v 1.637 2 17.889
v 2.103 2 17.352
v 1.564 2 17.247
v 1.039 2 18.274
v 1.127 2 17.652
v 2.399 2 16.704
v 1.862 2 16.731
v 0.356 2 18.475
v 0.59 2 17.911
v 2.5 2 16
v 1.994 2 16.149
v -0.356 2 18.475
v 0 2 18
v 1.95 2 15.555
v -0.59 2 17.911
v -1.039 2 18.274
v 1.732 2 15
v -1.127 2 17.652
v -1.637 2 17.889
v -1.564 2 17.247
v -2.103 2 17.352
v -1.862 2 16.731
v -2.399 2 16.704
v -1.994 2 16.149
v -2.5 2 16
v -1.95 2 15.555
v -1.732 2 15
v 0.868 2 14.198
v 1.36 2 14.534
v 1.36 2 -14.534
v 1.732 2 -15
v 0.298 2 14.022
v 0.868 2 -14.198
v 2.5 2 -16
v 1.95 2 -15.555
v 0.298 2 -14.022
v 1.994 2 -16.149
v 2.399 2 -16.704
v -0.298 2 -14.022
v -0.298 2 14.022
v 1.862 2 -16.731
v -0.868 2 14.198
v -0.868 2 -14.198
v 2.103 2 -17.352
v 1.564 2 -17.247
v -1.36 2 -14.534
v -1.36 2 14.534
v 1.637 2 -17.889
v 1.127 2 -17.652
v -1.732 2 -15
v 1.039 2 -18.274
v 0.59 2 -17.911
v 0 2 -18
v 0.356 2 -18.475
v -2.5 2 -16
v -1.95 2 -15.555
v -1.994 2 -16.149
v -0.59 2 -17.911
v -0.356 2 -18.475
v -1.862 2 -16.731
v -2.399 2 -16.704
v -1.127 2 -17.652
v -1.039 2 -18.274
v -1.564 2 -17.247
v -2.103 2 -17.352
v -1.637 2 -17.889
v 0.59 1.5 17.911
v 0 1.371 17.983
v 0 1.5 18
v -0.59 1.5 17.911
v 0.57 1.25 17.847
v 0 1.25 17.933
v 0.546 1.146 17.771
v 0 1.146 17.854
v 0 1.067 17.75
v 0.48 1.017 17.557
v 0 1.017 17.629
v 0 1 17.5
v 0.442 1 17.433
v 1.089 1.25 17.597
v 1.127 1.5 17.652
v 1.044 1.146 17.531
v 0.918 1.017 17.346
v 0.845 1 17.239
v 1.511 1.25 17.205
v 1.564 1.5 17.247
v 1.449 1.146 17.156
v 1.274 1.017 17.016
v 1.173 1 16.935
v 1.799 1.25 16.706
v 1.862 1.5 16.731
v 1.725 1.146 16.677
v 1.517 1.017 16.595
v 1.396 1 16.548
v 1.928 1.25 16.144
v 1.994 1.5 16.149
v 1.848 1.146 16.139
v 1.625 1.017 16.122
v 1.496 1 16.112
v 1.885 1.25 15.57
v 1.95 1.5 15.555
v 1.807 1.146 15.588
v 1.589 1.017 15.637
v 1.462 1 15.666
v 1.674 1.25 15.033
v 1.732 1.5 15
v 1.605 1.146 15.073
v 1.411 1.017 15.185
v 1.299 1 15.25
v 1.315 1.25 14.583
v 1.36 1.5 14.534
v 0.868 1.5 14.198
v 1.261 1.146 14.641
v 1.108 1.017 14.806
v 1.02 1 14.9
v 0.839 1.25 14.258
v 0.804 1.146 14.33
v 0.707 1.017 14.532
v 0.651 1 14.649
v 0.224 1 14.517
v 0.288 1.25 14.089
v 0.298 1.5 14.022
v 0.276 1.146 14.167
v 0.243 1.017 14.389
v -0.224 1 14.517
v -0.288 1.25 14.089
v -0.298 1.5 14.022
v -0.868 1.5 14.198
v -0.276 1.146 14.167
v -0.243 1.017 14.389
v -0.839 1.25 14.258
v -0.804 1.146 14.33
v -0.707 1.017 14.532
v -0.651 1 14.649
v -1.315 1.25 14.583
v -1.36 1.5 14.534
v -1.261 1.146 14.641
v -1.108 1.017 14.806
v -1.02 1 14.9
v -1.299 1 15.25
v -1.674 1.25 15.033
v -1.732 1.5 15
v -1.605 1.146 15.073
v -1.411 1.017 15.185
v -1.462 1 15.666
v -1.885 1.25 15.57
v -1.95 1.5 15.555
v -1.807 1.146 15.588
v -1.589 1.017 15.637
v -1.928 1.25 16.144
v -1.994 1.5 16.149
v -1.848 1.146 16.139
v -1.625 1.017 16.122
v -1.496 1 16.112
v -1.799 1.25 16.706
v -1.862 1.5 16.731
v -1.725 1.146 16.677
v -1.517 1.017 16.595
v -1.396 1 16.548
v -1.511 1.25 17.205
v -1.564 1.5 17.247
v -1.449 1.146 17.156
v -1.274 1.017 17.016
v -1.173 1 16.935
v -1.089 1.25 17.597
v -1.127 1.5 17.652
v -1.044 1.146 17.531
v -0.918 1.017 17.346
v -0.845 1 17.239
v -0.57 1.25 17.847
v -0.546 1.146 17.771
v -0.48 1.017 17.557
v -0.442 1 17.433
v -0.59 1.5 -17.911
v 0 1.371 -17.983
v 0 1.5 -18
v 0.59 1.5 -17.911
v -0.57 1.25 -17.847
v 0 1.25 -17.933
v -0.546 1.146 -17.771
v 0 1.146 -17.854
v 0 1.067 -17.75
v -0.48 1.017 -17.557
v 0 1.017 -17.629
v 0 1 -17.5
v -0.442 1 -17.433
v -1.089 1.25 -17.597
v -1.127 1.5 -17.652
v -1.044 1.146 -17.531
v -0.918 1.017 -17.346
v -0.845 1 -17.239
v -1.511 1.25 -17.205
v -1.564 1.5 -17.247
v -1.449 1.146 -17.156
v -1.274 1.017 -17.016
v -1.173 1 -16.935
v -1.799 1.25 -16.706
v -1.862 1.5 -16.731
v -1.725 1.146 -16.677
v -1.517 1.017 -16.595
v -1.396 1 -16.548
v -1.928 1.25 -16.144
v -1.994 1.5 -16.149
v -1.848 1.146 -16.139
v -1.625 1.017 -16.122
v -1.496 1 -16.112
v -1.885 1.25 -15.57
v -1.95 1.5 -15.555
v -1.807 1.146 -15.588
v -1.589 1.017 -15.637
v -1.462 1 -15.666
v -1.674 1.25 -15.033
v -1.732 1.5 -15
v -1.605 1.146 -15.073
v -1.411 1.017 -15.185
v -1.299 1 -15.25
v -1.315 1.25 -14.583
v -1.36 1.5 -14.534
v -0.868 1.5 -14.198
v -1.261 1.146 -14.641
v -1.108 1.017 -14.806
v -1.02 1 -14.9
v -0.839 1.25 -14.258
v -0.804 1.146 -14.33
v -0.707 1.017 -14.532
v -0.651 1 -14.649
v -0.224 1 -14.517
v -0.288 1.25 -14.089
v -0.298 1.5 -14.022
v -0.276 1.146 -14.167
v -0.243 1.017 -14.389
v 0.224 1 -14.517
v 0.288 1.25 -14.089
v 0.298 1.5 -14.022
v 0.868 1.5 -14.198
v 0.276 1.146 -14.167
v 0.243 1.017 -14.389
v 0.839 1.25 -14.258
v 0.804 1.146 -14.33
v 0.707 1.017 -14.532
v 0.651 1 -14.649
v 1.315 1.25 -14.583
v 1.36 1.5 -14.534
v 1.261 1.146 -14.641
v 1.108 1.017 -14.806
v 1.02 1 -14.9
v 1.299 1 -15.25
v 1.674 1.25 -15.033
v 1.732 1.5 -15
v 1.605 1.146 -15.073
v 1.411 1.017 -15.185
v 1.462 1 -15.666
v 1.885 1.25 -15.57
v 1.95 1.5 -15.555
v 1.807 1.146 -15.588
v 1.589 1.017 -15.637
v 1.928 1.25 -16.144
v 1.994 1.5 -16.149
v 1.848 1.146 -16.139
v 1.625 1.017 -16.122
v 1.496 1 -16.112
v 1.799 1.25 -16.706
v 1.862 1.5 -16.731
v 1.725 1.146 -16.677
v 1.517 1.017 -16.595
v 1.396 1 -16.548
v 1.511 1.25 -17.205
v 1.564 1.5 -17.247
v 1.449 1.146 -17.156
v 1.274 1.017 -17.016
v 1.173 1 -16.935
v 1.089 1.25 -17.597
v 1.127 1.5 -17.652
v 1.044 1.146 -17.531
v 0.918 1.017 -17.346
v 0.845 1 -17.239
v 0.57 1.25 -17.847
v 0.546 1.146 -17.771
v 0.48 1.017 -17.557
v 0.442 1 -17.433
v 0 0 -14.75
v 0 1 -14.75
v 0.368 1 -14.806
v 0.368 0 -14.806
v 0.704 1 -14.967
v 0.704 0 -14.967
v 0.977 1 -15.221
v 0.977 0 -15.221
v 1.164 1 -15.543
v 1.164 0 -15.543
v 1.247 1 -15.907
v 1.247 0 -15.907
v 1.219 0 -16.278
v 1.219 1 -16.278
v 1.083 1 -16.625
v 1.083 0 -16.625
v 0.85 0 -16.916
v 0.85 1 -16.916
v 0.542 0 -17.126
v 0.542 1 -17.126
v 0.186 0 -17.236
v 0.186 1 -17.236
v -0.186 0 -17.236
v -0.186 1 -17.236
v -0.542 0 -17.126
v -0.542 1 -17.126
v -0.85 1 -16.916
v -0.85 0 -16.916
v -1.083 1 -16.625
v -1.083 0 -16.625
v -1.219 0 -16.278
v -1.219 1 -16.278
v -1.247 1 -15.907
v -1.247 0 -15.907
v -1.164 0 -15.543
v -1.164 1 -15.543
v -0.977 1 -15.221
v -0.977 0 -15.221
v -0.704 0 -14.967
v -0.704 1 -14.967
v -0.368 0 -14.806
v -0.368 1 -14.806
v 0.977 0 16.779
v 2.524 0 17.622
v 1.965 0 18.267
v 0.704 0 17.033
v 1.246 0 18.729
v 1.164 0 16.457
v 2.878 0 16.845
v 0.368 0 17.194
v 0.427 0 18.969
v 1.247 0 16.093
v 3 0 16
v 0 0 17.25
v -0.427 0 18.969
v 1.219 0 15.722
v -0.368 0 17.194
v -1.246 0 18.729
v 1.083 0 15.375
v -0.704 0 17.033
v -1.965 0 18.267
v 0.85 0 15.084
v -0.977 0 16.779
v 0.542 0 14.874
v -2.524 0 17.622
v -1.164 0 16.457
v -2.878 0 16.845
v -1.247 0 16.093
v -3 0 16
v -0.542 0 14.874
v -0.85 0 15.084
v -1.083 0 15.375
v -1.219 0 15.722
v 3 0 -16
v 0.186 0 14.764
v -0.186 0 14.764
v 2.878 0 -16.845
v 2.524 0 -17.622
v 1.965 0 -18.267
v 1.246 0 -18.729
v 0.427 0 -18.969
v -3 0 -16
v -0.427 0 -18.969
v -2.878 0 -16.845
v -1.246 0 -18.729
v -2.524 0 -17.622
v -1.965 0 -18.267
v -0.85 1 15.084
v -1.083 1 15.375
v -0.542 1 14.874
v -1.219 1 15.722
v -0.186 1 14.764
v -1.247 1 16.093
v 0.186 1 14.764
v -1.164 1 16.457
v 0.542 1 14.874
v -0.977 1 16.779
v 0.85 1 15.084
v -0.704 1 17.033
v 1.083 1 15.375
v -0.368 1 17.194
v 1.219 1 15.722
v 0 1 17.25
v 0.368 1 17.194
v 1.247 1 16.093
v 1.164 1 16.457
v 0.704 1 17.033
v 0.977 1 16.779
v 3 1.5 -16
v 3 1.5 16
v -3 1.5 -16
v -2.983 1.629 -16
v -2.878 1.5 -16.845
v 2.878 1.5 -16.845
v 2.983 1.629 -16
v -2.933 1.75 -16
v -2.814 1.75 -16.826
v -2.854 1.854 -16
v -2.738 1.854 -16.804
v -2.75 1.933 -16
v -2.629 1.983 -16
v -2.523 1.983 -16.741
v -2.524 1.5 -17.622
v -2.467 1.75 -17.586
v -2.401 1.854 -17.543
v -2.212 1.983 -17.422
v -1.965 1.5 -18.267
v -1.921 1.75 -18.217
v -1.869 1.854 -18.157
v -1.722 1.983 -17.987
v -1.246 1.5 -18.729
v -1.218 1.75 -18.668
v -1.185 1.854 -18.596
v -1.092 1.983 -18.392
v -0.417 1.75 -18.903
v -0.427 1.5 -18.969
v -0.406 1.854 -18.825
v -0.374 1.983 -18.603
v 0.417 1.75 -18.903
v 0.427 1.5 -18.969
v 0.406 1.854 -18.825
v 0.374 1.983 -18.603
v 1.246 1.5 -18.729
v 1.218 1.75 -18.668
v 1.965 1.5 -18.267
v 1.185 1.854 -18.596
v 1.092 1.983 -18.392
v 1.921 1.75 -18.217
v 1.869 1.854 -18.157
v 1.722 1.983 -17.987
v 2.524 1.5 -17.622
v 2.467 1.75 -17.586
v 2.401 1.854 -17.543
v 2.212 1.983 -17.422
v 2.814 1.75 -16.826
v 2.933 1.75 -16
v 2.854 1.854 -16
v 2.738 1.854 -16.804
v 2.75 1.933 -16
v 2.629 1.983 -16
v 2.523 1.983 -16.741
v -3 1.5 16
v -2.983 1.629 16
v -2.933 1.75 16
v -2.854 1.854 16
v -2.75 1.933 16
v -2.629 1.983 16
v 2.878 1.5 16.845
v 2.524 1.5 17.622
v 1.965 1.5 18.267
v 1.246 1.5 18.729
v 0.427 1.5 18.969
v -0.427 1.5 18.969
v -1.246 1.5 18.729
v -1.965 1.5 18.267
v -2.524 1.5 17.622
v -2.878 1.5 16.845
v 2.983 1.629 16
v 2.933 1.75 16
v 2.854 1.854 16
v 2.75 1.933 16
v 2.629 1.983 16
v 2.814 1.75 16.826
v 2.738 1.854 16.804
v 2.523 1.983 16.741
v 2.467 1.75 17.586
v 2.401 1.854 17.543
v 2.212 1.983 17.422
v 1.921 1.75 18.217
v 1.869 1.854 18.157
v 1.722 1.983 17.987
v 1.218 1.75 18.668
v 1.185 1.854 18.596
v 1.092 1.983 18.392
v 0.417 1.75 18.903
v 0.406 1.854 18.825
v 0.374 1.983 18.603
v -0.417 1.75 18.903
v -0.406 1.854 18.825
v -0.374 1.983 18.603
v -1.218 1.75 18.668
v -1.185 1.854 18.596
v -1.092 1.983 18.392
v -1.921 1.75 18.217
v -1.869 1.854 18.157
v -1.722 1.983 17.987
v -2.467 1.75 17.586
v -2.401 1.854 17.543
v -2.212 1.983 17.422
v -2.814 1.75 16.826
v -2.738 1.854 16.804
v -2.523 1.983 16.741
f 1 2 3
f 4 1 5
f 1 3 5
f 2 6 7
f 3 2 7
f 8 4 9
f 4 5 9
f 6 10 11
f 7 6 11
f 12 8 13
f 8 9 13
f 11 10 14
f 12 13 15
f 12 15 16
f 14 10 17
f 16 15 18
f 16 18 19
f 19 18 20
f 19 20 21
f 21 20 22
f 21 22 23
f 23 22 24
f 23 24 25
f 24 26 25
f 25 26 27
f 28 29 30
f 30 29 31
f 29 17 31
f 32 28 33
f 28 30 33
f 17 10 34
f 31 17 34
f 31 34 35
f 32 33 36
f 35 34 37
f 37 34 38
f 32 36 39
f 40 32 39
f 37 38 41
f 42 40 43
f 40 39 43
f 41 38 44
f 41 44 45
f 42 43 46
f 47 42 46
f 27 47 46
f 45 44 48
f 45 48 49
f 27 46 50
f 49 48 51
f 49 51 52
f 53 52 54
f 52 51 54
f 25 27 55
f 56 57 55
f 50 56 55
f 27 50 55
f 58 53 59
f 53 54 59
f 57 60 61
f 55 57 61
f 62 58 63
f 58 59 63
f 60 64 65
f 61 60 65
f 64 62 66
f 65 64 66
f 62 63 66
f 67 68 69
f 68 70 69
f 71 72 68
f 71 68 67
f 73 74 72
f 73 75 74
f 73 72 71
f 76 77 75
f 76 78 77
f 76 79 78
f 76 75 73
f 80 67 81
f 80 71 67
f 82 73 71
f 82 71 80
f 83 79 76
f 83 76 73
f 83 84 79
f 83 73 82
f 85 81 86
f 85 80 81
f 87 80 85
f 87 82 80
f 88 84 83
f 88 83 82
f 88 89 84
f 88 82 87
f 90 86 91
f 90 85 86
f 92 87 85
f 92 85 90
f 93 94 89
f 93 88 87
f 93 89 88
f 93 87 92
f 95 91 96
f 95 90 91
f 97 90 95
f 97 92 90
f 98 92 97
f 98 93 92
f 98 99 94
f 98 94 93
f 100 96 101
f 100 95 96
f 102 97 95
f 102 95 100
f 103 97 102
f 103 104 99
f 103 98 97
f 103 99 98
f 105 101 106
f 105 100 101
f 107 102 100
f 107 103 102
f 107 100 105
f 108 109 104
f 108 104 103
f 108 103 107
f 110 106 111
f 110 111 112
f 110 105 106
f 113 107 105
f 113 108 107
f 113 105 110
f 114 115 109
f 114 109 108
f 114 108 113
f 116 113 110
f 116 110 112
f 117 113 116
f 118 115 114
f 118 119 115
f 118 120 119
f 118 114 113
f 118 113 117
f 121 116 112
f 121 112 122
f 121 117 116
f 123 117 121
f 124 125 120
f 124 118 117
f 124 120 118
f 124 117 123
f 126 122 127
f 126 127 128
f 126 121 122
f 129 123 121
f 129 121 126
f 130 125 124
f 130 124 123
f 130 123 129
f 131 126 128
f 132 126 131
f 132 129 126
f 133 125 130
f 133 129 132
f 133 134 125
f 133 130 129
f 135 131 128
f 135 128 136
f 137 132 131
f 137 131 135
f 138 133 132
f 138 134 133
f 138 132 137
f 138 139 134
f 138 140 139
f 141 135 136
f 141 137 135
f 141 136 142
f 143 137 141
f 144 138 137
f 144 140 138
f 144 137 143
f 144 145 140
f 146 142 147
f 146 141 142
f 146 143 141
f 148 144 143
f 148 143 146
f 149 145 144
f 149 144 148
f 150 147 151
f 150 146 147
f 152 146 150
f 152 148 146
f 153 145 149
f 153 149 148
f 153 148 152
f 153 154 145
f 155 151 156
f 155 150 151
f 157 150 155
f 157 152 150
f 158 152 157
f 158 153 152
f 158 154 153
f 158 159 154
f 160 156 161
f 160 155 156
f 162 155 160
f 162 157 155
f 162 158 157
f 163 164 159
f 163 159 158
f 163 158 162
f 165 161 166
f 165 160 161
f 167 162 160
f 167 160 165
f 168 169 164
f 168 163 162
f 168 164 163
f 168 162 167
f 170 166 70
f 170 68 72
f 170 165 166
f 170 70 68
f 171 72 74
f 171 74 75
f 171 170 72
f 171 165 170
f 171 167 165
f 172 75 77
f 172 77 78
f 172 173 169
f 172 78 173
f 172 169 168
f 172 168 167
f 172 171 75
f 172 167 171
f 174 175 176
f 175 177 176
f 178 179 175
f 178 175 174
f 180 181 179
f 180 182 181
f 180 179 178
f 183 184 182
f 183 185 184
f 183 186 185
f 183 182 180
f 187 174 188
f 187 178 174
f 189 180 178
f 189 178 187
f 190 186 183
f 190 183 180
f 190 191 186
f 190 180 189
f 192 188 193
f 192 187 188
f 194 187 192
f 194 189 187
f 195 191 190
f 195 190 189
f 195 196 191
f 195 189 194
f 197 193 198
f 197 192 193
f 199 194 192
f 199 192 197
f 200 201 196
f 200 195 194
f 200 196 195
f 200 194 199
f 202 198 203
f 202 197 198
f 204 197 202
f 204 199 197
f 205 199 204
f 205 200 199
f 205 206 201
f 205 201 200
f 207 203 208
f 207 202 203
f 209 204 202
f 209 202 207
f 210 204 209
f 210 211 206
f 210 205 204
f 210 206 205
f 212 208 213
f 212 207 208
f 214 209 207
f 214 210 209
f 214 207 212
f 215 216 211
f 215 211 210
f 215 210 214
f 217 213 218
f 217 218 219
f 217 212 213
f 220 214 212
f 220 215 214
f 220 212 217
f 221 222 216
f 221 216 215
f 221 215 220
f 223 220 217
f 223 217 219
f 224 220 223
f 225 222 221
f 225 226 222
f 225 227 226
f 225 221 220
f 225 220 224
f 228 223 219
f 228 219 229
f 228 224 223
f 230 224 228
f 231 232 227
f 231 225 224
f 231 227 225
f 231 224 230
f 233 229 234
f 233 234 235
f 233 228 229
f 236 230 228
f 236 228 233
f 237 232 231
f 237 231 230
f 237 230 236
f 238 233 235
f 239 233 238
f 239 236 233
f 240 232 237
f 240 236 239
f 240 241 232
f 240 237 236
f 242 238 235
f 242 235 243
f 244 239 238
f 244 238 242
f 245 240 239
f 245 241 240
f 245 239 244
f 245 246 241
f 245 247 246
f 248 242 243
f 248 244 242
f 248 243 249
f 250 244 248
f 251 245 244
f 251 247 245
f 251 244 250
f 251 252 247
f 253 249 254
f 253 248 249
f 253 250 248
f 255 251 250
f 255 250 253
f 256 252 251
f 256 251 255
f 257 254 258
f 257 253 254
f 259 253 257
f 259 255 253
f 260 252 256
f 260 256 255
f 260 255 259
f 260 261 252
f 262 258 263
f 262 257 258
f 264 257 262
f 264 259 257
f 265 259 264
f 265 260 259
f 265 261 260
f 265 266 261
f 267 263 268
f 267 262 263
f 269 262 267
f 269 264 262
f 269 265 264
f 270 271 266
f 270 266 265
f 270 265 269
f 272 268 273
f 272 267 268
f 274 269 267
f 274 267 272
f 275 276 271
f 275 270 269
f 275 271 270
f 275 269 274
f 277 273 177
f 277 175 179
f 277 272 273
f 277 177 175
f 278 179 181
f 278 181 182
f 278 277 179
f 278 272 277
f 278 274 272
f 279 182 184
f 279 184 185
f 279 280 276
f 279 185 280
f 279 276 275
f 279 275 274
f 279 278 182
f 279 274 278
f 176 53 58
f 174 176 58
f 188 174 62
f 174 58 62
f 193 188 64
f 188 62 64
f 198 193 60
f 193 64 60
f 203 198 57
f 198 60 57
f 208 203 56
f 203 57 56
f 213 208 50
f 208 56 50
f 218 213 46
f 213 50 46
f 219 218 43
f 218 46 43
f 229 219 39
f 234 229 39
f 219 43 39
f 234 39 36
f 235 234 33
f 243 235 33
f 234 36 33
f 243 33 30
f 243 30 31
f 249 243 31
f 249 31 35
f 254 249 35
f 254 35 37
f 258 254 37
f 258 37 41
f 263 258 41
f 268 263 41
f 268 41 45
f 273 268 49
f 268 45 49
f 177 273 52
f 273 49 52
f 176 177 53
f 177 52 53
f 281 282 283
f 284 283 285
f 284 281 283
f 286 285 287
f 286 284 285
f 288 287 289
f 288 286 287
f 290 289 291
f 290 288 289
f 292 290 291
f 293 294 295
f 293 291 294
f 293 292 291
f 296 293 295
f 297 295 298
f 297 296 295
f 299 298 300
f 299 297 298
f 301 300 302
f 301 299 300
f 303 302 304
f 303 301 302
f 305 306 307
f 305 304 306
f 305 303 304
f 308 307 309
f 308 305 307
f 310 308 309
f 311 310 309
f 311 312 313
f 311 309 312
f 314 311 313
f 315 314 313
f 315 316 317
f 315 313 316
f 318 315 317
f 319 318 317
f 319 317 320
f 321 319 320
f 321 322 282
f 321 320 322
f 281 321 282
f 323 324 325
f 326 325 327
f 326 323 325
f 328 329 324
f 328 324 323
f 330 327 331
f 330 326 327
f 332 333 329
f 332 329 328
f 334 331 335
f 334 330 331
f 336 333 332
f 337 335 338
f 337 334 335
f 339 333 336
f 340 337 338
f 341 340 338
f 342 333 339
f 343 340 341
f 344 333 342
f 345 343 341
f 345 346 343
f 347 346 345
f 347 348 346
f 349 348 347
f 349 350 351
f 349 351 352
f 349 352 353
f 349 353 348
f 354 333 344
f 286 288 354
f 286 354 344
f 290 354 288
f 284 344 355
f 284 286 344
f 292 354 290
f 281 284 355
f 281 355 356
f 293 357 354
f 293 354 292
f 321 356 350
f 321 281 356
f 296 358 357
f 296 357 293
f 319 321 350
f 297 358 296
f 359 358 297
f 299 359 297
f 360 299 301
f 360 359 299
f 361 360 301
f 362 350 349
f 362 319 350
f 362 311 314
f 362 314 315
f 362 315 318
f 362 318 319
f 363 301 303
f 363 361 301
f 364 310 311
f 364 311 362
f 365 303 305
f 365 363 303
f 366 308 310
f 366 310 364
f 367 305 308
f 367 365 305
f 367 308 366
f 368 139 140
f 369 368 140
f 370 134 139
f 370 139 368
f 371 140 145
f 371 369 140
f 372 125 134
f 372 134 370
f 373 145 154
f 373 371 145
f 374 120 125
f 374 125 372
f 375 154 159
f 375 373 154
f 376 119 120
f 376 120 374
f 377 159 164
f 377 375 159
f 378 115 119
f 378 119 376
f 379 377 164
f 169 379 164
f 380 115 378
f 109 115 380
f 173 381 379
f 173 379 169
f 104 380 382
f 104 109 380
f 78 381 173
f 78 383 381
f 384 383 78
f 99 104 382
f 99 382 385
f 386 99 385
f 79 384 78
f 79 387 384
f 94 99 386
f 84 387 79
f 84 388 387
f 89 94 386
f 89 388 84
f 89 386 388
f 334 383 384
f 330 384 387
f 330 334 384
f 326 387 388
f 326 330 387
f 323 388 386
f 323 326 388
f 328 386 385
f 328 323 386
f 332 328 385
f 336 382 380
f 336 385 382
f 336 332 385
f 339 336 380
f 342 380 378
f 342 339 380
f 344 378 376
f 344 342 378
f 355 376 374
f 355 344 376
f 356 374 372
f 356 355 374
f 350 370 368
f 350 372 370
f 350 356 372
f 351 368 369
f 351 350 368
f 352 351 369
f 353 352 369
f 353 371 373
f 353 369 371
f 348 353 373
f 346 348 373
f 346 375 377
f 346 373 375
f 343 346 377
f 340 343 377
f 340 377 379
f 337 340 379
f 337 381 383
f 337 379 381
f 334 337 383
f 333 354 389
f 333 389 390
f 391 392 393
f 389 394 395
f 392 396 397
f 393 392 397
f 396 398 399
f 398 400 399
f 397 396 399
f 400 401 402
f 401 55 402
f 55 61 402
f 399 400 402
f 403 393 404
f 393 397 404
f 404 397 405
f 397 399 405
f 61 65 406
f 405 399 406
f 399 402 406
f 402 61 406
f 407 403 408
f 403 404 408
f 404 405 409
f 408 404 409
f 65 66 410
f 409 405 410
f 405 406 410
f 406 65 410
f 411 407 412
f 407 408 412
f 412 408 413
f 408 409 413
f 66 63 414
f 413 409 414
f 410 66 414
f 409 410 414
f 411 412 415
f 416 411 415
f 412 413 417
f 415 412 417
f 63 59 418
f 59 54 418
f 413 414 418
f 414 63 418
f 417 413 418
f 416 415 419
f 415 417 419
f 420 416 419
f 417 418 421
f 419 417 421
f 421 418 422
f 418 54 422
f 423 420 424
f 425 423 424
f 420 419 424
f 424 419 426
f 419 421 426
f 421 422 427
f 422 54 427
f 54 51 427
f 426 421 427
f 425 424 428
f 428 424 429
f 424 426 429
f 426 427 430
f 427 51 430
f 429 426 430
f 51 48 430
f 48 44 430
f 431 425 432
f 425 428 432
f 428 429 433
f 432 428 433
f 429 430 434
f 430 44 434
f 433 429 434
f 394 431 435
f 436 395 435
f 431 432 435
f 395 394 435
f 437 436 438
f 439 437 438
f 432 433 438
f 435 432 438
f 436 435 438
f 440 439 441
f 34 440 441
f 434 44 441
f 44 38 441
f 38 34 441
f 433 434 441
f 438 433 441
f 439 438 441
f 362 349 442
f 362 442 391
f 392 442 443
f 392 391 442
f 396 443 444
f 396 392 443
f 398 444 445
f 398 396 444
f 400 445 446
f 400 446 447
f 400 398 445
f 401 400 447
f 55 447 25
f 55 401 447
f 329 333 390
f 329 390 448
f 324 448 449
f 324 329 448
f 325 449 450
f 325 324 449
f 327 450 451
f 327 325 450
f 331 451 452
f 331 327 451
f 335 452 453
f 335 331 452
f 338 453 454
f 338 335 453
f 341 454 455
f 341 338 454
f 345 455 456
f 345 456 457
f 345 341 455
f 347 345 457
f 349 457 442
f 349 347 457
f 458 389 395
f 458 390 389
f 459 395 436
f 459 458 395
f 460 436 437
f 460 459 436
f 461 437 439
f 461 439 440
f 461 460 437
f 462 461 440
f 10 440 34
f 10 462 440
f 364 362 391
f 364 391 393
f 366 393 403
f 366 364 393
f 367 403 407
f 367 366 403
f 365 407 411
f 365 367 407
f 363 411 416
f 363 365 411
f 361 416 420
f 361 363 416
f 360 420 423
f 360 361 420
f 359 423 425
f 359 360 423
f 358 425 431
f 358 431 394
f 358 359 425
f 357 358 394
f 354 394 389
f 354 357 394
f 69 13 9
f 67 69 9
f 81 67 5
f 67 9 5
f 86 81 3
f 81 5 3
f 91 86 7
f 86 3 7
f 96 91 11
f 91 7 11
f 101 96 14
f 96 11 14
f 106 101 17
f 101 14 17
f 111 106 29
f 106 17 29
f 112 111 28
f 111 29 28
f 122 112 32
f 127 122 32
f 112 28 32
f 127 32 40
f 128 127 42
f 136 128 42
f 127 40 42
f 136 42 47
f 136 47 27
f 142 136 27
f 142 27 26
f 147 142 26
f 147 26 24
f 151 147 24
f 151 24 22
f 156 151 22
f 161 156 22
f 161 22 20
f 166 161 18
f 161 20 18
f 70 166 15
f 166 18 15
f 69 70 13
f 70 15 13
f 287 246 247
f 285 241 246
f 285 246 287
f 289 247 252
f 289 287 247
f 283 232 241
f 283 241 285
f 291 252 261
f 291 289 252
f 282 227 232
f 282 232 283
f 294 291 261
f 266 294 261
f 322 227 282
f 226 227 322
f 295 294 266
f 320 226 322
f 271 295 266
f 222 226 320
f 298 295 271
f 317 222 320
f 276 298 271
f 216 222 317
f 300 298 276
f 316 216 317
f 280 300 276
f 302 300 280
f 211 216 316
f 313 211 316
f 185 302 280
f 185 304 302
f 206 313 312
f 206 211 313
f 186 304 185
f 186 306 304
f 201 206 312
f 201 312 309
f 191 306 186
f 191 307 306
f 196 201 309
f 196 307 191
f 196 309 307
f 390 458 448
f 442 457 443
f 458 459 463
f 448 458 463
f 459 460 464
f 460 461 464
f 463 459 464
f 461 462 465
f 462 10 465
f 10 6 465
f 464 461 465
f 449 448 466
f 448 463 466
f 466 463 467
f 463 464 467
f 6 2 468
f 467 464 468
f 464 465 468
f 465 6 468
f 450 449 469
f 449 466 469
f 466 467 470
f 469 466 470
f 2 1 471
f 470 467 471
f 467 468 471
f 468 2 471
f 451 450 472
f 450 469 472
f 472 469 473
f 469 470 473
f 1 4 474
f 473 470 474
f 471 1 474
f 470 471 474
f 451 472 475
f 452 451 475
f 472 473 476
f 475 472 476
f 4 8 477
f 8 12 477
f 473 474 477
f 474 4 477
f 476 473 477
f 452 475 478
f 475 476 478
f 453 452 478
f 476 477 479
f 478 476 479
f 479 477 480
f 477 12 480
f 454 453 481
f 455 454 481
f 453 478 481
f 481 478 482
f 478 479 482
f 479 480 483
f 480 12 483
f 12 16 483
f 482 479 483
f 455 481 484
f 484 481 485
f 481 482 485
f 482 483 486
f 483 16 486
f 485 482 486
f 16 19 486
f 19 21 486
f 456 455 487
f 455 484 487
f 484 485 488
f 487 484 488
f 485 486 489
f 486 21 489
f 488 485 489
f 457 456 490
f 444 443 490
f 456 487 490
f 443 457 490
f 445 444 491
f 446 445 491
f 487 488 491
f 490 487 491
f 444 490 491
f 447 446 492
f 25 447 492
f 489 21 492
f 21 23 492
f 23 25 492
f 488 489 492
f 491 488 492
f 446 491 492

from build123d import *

# Parameters (mm, degrees)
SKETCH1_R           = 1.25
BOSS_EXTRUDE1_DEPTH = 2
SKETCH2_R           = 2
CUT_EXTRUDE1_DEPTH  = 1
FILLET1_R           = 0.5


with BuildPart() as part:
    # Sketch1 → Boss-Extrude1 (new body)
    with BuildSketch(Plane(origin=(0, 0, 0), x_dir=(1, 0, 0), z_dir=(0, 1, 0))):
        with BuildLine():
            Line((-3, -16), (-3, 16))
            ThreePointArc((-3, 16), (0, 19), (3, 16))
            Line((3, 16), (3, -16))
            ThreePointArc((3, -16), (0, -19), (-3, -16))
        make_face()
        with Locations(Location((0, 16, 0), (0, 0, 270))):
            Circle(SKETCH1_R, mode=Mode.SUBTRACT)
        with Locations(Location((0, -16, 0), (0, 0, 270))):
            Circle(SKETCH1_R, mode=Mode.SUBTRACT)
    extrude(amount=BOSS_EXTRUDE1_DEPTH)

    # Sketch2 → Cut-Extrude1 (cut)
    with BuildSketch(Plane(origin=(0, 2, 0), x_dir=(1, 0, 0), z_dir=(0, 1, 0))):
        with Locations(Location((0, -16, 0), (0, 0, 270))):
            Circle(SKETCH2_R)
        with Locations(Location((0, 16, 0), (0, 0, 90))):
            Circle(SKETCH2_R)
    extrude(amount=-CUT_EXTRUDE1_DEPTH, mode=Mode.SUBTRACT)

    # Fillet1
    fillet1_edges = [part.edges().sort_by_distance(p)[0] for p in [
        (0, 2, -19),
        (-3, 2, 0),
        (0, 1, 14),
        (0, 1, -14),
        (0, 2, 19),
        (3, 2, 0),
    ]]
    fillet(fillet1_edges, radius=FILLET1_R)


solid = part.part
